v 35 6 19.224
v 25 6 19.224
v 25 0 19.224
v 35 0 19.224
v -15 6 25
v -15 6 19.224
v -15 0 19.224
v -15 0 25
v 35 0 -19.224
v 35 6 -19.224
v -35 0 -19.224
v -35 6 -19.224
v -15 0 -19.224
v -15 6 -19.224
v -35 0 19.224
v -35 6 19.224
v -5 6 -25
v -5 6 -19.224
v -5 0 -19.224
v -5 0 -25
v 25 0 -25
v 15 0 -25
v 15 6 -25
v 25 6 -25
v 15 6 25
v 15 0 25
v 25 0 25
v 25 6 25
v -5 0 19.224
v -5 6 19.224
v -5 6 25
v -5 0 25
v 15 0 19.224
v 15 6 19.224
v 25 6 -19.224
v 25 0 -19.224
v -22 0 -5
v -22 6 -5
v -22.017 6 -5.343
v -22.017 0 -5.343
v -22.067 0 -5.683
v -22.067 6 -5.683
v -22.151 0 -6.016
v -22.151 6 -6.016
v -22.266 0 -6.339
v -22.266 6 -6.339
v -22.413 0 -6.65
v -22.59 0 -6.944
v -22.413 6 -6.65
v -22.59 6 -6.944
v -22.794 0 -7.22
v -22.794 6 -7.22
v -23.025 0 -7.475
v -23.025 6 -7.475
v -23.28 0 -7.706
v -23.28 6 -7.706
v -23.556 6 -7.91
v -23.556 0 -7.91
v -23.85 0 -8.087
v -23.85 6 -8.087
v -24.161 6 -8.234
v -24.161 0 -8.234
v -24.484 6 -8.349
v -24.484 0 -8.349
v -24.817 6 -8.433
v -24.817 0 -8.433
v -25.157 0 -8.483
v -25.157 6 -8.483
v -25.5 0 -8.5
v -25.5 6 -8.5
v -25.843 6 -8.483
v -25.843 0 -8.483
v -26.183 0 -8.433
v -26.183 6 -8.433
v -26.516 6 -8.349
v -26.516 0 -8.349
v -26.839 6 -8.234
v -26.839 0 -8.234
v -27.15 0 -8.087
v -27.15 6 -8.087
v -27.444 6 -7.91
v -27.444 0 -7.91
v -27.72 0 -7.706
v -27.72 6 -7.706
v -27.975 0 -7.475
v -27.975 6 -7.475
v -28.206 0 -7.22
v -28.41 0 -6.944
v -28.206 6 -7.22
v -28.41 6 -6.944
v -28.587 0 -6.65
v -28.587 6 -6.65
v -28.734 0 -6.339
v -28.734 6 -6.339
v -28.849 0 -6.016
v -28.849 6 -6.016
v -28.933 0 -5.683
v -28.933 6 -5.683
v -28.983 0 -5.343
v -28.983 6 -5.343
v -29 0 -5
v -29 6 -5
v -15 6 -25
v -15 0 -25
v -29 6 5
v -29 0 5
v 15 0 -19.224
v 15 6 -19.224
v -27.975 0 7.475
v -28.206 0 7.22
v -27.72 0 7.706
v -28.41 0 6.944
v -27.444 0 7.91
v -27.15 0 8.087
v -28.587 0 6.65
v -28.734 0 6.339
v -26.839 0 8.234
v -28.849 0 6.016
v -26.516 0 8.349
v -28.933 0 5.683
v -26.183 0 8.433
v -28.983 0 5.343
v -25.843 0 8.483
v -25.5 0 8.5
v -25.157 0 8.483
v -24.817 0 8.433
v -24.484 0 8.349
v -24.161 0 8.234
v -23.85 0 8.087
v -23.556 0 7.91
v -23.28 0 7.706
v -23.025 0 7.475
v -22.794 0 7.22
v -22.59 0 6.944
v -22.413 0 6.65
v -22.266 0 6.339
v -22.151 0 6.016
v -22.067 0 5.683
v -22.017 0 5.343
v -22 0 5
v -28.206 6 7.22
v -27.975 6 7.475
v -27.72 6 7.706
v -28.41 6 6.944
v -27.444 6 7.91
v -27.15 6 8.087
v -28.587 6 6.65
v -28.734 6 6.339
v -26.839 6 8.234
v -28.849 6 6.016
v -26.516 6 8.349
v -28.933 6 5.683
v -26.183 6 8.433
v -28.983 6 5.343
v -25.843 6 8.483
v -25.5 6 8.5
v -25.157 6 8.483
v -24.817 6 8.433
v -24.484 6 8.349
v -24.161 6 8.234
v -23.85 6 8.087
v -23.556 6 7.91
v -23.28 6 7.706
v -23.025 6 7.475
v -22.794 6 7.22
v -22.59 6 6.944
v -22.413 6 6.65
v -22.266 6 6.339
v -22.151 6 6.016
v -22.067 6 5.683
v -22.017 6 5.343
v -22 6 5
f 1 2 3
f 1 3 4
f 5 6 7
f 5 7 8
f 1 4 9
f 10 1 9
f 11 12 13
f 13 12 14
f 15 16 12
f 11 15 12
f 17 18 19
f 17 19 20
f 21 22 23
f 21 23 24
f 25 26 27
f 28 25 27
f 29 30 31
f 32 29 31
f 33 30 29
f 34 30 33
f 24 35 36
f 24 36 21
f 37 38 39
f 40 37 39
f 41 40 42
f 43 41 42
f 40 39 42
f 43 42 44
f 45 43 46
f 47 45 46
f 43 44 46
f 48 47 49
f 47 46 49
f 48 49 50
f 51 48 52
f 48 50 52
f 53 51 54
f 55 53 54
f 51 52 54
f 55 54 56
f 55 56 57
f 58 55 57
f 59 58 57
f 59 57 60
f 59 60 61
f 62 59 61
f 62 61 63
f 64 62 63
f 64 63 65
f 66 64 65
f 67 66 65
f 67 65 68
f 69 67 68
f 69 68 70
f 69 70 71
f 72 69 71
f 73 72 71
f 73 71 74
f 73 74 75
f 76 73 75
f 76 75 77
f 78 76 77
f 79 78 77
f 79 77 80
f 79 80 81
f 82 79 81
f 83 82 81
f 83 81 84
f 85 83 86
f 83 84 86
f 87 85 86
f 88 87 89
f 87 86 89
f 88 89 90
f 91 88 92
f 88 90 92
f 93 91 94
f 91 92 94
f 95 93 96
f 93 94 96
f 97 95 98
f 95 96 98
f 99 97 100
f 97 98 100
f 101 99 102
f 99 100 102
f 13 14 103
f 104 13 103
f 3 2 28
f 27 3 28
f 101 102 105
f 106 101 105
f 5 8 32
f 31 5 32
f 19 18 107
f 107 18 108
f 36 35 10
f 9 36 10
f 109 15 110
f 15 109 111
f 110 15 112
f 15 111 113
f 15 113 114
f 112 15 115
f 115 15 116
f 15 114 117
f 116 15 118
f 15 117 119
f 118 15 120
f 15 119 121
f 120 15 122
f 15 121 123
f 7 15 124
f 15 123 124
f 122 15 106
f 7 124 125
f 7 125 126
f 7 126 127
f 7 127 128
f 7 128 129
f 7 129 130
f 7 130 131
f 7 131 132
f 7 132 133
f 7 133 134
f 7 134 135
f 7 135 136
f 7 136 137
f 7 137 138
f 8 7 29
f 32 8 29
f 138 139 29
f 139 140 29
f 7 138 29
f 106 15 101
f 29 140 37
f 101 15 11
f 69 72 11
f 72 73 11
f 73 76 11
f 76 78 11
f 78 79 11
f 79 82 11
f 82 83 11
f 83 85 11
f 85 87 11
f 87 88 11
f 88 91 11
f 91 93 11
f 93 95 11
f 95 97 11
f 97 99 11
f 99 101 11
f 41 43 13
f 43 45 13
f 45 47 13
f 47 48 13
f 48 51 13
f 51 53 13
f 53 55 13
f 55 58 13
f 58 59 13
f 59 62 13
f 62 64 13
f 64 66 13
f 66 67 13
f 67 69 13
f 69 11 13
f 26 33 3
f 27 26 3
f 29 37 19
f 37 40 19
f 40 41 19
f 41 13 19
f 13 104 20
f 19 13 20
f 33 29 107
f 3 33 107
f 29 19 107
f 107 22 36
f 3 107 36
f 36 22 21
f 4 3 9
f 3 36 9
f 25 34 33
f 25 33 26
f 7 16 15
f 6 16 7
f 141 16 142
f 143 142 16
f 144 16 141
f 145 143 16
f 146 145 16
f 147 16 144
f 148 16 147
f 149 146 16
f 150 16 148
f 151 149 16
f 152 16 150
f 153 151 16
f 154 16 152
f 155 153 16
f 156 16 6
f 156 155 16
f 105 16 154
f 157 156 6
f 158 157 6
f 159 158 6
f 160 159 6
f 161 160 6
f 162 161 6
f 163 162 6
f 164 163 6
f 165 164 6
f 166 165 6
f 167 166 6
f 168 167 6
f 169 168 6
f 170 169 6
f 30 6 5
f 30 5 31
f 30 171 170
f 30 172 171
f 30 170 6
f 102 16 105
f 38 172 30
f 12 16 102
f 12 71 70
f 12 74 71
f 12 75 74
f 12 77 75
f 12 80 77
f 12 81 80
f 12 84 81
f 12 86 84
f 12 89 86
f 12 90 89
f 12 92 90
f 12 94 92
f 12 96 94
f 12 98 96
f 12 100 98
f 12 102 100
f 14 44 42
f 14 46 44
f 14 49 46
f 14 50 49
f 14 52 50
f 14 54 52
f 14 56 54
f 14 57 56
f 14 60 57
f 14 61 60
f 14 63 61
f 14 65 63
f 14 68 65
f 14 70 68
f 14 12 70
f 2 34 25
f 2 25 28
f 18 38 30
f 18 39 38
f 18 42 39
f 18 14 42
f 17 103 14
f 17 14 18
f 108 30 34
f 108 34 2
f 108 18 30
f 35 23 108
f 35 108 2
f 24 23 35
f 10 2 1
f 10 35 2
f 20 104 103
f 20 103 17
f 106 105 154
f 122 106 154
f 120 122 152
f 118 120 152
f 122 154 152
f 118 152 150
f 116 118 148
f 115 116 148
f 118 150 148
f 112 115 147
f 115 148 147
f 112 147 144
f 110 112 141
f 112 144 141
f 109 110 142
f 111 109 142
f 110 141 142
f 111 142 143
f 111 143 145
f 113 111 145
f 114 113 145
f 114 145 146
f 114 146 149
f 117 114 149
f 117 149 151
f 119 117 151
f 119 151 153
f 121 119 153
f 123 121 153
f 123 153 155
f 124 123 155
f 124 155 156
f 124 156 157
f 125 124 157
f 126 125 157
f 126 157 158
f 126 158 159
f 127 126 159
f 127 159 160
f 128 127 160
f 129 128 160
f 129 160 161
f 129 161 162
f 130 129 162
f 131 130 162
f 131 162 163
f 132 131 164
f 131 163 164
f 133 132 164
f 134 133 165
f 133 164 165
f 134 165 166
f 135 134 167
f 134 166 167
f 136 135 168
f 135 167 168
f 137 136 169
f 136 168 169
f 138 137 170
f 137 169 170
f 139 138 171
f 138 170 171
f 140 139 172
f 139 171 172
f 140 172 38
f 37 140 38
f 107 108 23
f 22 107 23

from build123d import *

# Parameters (mm, degrees)
SKETCH1_W           = 60
SKETCH1_H           = 50
BOSS_EXTRUDE1_DEPTH = 6
SKETCH3_W           = 10
SKETCH3_H           = 5.775633532
SKETCH3_W_2         = 20
CUT_EXTRUDE2_DEPTH  = 7
SKETCH4_W           = 10
SKETCH4_H           = 38.448732936
BOSS_EXTRUDE2_DEPTH = 6
CUT_EXTRUDE3_DEPTH  = 7


with BuildPart() as part:
    # Sketch1 → Boss-Extrude1 (new body)
    with BuildSketch(Plane(origin=(0, 0, 0), x_dir=(1, 0, 0), z_dir=(0, 1, 0))):
        with Locations((5, 0)):
            Rectangle(SKETCH1_W, SKETCH1_H)
    extrude(amount=BOSS_EXTRUDE1_DEPTH)

    # Sketch3 → Cut-Extrude2 (cut, through all)
    with BuildSketch(Plane(origin=(0, 6, 0), x_dir=(1, 0, 0), z_dir=(0, 1, 0))):
        with Locations((30, 22.112183234)):
            Rectangle(SKETCH3_W, SKETCH3_H)
        with Locations((5, 22.112183234)):
            Rectangle(SKETCH3_W_2, SKETCH3_H)
        with Locations((-20, 22.112183234)):
            Rectangle(SKETCH3_W, SKETCH3_H)
    cut_extrude2 = extrude(amount=-CUT_EXTRUDE2_DEPTH, mode=Mode.SUBTRACT)

    # Mirror2: Cut-Extrude2 across plane
    add(cut_extrude2.mirror(Plane.XY), mode=Mode.SUBTRACT)

    # Sketch4 → Boss-Extrude2 (add)
    with BuildSketch(Plane(origin=(0, 6, 0), x_dir=(1, 0, 0), z_dir=(0, 1, 0))):
        with Locations((-30, 0)):
            Rectangle(SKETCH4_W, SKETCH4_H)
    extrude(amount=-BOSS_EXTRUDE2_DEPTH)

    # Sketch5 → Cut-Extrude3 (cut, through all)
    with BuildSketch(Plane(origin=(0, 6, 0), x_dir=(1, 0, 0), z_dir=(0, 1, 0))):
        with BuildLine():
            Line((-22, -5), (-22, 5))
            ThreePointArc((-22, 5), (-25.5, 8.5), (-29, 5))
            Line((-29, 5), (-29, -5))
            ThreePointArc((-29, -5), (-25.5, -8.5), (-22, -5))
        make_face()
    extrude(amount=-CUT_EXTRUDE3_DEPTH, mode=Mode.SUBTRACT)


solid = part.part
